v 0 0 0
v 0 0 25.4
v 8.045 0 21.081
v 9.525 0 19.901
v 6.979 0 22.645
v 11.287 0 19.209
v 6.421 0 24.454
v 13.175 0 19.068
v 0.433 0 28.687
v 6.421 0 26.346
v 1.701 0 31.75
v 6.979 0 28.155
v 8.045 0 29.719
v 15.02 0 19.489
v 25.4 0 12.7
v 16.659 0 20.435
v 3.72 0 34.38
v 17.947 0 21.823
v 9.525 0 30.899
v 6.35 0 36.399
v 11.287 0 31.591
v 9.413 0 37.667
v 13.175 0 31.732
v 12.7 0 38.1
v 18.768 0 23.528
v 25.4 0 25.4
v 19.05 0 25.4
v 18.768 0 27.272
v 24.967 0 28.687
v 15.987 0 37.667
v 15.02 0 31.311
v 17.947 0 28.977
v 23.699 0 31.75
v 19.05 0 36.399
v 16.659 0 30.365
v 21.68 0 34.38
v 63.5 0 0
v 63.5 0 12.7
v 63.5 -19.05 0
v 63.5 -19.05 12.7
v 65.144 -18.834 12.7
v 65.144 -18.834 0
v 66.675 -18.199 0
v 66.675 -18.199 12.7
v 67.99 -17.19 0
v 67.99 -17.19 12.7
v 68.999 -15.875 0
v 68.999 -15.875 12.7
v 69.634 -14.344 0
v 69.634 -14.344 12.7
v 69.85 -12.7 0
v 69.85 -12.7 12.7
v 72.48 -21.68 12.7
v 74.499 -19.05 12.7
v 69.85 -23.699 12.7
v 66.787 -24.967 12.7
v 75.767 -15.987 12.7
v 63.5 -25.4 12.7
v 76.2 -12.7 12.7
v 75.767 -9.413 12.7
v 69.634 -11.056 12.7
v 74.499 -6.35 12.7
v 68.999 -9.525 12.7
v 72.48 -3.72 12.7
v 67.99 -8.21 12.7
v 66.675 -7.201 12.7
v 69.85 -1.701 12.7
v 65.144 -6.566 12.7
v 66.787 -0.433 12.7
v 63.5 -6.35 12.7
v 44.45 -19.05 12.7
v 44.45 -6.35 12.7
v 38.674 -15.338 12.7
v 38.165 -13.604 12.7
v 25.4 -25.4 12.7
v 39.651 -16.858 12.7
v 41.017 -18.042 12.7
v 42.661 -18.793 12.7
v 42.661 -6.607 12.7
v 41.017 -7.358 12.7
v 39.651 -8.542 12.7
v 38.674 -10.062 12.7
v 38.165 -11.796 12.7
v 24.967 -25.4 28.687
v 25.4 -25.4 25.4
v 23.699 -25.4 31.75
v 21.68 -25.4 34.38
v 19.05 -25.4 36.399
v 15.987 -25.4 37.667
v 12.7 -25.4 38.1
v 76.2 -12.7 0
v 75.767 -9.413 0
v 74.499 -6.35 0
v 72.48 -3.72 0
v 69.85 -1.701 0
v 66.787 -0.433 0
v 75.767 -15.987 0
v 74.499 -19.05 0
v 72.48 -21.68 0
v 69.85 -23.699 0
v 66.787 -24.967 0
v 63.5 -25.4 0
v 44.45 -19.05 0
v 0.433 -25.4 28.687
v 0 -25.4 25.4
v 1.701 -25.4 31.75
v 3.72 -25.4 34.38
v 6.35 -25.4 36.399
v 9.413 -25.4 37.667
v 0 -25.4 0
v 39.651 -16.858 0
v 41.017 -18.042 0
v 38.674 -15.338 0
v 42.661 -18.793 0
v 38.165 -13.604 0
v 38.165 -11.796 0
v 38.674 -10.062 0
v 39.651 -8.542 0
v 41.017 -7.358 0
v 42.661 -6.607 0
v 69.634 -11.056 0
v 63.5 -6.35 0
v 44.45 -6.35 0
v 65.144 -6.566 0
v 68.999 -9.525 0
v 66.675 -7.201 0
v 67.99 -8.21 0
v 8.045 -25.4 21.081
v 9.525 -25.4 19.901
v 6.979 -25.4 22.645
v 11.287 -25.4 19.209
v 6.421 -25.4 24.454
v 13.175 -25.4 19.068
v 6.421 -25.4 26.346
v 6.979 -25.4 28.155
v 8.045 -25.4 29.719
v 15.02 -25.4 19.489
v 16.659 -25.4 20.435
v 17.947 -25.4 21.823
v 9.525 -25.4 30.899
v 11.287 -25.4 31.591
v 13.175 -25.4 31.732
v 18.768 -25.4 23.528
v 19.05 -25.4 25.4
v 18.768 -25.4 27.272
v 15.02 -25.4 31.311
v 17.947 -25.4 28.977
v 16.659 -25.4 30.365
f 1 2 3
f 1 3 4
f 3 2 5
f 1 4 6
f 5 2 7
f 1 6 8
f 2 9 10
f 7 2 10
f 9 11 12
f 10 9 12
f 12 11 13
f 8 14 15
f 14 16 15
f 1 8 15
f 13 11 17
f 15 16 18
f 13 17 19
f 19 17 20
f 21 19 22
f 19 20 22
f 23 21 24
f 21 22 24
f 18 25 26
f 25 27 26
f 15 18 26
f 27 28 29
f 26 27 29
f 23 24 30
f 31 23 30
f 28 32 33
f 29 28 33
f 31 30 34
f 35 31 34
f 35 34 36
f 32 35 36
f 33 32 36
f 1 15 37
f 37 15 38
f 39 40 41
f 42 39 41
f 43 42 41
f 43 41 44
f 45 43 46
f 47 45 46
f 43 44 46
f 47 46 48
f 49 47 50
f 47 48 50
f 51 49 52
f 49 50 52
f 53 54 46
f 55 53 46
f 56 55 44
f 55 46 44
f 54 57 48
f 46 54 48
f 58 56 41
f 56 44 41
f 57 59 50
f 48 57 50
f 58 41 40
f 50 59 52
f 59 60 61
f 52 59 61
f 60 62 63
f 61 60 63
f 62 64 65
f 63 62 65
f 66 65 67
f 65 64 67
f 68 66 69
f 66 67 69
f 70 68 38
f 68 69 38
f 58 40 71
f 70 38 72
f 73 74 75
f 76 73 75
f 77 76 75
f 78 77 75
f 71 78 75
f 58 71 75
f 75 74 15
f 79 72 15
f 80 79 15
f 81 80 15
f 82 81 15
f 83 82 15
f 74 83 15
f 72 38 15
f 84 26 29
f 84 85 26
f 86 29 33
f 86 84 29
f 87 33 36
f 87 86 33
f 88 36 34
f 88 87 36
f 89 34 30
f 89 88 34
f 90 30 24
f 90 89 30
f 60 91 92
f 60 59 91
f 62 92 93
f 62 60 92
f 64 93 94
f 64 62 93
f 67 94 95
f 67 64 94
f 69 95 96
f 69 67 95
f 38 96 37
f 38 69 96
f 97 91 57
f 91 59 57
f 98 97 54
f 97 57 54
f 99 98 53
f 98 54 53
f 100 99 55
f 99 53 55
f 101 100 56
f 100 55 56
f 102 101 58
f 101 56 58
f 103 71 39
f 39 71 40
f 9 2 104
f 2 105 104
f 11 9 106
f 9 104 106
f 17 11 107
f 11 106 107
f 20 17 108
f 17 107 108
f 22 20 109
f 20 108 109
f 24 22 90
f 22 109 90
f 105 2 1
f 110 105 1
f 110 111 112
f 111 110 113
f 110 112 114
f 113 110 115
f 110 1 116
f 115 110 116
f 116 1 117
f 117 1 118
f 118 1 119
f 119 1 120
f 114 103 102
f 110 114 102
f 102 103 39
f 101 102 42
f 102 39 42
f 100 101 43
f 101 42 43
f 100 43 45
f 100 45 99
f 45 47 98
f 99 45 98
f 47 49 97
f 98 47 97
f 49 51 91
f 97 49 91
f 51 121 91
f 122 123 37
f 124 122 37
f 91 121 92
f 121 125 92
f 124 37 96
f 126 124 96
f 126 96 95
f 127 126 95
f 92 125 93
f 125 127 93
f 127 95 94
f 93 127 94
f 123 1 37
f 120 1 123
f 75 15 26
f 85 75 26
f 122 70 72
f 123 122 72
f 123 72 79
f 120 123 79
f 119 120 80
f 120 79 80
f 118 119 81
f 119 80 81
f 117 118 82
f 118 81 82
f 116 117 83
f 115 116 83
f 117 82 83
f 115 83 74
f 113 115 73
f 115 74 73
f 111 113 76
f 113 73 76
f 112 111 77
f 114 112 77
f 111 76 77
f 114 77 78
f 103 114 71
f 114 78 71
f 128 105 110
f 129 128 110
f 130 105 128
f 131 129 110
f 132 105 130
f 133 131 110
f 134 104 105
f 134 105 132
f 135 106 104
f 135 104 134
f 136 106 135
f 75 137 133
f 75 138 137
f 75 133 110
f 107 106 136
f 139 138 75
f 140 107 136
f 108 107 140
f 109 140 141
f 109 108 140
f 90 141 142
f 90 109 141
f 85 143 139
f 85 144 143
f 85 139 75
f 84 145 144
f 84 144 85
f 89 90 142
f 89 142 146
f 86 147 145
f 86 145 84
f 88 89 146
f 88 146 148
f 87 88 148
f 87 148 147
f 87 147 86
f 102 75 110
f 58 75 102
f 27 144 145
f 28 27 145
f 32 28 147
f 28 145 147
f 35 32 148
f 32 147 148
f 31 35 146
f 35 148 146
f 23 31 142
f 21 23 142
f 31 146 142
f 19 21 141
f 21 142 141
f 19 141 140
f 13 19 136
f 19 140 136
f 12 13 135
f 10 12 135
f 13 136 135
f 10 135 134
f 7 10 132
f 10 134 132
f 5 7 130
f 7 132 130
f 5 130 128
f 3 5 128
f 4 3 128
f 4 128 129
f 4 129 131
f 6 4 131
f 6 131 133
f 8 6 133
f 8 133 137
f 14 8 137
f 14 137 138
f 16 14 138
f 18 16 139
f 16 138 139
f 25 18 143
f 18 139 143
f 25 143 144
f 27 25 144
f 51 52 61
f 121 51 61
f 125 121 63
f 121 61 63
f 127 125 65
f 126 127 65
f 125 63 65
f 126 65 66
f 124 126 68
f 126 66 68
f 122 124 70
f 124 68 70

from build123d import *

# Parameters (mm, degrees)
F1_DEPTH = 25.4
F2_R     = 12.69999
F3_R     = 6.35
F4_DEPTH = 25.4
F6_DEPTH = 25.4


# Not quite as in the source:
# - a fillet or chamfer is up to 0.001 mm smaller than in the source, because OpenCascade refuses the exact size


with BuildPart() as f1:
    # F0 (on Front) → F1 (new body)
    with BuildSketch(Plane.XZ):
        Polygon((0, 38.1), (0, 0), (76.2, 0), (76.2, 12.7), (25.4, 12.7), (25.4, 38.1), align=None)
    extrude(amount=F1_DEPTH)

    # F2 (radius 12.7 in the source; OpenCascade refuses exactly that, so slightly less here)
    f2_edges = [f1.edges().sort_by_distance(p)[0] for p in [
        (25.4, -12.7, 38.1),
        (0, -12.7, 38.1),
        (76.2, -25.4, 6.35),
        (76.2, 0, 6.35),
    ]]
    fillet(f2_edges, radius=F2_R)

    # F3 (on face) → F4 (cut)
    with BuildSketch(Plane.XZ.offset(25.4)):
        with Locations((12.7, 25.4)):
            Circle(F3_R)
    extrude(amount=-F4_DEPTH, mode=Mode.SUBTRACT)

    # F5 (on face) → F6 (cut)
    with BuildSketch(Plane.XY.offset(12.7)):
        with BuildLine():
            ThreePointArc((44.45, -19.05), (48.9401287414, -17.1901284329), (50.8000010533, -12.7))
            ThreePointArc((50.8000010533, -12.7), (48.9401287414, -8.2098715671), (44.45, -6.35))
            ThreePointArc((44.45, -6.35), (38.1000010533, -12.7), (44.45, -19.05))
        make_face()
        with BuildLine():
            ThreePointArc((44.45, -6.35), (48.9401287414, -8.2098715671), (50.8000010533, -12.7))
            ThreePointArc((50.8000010533, -12.7), (48.9401287414, -17.1901284329), (44.45, -19.05))
            Line((44.45, -19.05), (63.5, -19.05))
            ThreePointArc((63.5, -19.05), (57.15, -12.7), (63.5, -6.35))
            Line((63.5, -6.35), (44.45, -6.35))
        make_face()
        with BuildLine():
            ThreePointArc((69.85, -12.7), (67.9901280605, -8.2098719395), (63.5, -6.35))
            ThreePointArc((63.5, -6.35), (57.15, -12.7), (63.5, -19.05))
            ThreePointArc((63.5, -19.05), (67.9901280605, -17.1901280605), (69.85, -12.7))
        make_face()
    extrude(amount=-F6_DEPTH, mode=Mode.SUBTRACT)


solid = f1.part
